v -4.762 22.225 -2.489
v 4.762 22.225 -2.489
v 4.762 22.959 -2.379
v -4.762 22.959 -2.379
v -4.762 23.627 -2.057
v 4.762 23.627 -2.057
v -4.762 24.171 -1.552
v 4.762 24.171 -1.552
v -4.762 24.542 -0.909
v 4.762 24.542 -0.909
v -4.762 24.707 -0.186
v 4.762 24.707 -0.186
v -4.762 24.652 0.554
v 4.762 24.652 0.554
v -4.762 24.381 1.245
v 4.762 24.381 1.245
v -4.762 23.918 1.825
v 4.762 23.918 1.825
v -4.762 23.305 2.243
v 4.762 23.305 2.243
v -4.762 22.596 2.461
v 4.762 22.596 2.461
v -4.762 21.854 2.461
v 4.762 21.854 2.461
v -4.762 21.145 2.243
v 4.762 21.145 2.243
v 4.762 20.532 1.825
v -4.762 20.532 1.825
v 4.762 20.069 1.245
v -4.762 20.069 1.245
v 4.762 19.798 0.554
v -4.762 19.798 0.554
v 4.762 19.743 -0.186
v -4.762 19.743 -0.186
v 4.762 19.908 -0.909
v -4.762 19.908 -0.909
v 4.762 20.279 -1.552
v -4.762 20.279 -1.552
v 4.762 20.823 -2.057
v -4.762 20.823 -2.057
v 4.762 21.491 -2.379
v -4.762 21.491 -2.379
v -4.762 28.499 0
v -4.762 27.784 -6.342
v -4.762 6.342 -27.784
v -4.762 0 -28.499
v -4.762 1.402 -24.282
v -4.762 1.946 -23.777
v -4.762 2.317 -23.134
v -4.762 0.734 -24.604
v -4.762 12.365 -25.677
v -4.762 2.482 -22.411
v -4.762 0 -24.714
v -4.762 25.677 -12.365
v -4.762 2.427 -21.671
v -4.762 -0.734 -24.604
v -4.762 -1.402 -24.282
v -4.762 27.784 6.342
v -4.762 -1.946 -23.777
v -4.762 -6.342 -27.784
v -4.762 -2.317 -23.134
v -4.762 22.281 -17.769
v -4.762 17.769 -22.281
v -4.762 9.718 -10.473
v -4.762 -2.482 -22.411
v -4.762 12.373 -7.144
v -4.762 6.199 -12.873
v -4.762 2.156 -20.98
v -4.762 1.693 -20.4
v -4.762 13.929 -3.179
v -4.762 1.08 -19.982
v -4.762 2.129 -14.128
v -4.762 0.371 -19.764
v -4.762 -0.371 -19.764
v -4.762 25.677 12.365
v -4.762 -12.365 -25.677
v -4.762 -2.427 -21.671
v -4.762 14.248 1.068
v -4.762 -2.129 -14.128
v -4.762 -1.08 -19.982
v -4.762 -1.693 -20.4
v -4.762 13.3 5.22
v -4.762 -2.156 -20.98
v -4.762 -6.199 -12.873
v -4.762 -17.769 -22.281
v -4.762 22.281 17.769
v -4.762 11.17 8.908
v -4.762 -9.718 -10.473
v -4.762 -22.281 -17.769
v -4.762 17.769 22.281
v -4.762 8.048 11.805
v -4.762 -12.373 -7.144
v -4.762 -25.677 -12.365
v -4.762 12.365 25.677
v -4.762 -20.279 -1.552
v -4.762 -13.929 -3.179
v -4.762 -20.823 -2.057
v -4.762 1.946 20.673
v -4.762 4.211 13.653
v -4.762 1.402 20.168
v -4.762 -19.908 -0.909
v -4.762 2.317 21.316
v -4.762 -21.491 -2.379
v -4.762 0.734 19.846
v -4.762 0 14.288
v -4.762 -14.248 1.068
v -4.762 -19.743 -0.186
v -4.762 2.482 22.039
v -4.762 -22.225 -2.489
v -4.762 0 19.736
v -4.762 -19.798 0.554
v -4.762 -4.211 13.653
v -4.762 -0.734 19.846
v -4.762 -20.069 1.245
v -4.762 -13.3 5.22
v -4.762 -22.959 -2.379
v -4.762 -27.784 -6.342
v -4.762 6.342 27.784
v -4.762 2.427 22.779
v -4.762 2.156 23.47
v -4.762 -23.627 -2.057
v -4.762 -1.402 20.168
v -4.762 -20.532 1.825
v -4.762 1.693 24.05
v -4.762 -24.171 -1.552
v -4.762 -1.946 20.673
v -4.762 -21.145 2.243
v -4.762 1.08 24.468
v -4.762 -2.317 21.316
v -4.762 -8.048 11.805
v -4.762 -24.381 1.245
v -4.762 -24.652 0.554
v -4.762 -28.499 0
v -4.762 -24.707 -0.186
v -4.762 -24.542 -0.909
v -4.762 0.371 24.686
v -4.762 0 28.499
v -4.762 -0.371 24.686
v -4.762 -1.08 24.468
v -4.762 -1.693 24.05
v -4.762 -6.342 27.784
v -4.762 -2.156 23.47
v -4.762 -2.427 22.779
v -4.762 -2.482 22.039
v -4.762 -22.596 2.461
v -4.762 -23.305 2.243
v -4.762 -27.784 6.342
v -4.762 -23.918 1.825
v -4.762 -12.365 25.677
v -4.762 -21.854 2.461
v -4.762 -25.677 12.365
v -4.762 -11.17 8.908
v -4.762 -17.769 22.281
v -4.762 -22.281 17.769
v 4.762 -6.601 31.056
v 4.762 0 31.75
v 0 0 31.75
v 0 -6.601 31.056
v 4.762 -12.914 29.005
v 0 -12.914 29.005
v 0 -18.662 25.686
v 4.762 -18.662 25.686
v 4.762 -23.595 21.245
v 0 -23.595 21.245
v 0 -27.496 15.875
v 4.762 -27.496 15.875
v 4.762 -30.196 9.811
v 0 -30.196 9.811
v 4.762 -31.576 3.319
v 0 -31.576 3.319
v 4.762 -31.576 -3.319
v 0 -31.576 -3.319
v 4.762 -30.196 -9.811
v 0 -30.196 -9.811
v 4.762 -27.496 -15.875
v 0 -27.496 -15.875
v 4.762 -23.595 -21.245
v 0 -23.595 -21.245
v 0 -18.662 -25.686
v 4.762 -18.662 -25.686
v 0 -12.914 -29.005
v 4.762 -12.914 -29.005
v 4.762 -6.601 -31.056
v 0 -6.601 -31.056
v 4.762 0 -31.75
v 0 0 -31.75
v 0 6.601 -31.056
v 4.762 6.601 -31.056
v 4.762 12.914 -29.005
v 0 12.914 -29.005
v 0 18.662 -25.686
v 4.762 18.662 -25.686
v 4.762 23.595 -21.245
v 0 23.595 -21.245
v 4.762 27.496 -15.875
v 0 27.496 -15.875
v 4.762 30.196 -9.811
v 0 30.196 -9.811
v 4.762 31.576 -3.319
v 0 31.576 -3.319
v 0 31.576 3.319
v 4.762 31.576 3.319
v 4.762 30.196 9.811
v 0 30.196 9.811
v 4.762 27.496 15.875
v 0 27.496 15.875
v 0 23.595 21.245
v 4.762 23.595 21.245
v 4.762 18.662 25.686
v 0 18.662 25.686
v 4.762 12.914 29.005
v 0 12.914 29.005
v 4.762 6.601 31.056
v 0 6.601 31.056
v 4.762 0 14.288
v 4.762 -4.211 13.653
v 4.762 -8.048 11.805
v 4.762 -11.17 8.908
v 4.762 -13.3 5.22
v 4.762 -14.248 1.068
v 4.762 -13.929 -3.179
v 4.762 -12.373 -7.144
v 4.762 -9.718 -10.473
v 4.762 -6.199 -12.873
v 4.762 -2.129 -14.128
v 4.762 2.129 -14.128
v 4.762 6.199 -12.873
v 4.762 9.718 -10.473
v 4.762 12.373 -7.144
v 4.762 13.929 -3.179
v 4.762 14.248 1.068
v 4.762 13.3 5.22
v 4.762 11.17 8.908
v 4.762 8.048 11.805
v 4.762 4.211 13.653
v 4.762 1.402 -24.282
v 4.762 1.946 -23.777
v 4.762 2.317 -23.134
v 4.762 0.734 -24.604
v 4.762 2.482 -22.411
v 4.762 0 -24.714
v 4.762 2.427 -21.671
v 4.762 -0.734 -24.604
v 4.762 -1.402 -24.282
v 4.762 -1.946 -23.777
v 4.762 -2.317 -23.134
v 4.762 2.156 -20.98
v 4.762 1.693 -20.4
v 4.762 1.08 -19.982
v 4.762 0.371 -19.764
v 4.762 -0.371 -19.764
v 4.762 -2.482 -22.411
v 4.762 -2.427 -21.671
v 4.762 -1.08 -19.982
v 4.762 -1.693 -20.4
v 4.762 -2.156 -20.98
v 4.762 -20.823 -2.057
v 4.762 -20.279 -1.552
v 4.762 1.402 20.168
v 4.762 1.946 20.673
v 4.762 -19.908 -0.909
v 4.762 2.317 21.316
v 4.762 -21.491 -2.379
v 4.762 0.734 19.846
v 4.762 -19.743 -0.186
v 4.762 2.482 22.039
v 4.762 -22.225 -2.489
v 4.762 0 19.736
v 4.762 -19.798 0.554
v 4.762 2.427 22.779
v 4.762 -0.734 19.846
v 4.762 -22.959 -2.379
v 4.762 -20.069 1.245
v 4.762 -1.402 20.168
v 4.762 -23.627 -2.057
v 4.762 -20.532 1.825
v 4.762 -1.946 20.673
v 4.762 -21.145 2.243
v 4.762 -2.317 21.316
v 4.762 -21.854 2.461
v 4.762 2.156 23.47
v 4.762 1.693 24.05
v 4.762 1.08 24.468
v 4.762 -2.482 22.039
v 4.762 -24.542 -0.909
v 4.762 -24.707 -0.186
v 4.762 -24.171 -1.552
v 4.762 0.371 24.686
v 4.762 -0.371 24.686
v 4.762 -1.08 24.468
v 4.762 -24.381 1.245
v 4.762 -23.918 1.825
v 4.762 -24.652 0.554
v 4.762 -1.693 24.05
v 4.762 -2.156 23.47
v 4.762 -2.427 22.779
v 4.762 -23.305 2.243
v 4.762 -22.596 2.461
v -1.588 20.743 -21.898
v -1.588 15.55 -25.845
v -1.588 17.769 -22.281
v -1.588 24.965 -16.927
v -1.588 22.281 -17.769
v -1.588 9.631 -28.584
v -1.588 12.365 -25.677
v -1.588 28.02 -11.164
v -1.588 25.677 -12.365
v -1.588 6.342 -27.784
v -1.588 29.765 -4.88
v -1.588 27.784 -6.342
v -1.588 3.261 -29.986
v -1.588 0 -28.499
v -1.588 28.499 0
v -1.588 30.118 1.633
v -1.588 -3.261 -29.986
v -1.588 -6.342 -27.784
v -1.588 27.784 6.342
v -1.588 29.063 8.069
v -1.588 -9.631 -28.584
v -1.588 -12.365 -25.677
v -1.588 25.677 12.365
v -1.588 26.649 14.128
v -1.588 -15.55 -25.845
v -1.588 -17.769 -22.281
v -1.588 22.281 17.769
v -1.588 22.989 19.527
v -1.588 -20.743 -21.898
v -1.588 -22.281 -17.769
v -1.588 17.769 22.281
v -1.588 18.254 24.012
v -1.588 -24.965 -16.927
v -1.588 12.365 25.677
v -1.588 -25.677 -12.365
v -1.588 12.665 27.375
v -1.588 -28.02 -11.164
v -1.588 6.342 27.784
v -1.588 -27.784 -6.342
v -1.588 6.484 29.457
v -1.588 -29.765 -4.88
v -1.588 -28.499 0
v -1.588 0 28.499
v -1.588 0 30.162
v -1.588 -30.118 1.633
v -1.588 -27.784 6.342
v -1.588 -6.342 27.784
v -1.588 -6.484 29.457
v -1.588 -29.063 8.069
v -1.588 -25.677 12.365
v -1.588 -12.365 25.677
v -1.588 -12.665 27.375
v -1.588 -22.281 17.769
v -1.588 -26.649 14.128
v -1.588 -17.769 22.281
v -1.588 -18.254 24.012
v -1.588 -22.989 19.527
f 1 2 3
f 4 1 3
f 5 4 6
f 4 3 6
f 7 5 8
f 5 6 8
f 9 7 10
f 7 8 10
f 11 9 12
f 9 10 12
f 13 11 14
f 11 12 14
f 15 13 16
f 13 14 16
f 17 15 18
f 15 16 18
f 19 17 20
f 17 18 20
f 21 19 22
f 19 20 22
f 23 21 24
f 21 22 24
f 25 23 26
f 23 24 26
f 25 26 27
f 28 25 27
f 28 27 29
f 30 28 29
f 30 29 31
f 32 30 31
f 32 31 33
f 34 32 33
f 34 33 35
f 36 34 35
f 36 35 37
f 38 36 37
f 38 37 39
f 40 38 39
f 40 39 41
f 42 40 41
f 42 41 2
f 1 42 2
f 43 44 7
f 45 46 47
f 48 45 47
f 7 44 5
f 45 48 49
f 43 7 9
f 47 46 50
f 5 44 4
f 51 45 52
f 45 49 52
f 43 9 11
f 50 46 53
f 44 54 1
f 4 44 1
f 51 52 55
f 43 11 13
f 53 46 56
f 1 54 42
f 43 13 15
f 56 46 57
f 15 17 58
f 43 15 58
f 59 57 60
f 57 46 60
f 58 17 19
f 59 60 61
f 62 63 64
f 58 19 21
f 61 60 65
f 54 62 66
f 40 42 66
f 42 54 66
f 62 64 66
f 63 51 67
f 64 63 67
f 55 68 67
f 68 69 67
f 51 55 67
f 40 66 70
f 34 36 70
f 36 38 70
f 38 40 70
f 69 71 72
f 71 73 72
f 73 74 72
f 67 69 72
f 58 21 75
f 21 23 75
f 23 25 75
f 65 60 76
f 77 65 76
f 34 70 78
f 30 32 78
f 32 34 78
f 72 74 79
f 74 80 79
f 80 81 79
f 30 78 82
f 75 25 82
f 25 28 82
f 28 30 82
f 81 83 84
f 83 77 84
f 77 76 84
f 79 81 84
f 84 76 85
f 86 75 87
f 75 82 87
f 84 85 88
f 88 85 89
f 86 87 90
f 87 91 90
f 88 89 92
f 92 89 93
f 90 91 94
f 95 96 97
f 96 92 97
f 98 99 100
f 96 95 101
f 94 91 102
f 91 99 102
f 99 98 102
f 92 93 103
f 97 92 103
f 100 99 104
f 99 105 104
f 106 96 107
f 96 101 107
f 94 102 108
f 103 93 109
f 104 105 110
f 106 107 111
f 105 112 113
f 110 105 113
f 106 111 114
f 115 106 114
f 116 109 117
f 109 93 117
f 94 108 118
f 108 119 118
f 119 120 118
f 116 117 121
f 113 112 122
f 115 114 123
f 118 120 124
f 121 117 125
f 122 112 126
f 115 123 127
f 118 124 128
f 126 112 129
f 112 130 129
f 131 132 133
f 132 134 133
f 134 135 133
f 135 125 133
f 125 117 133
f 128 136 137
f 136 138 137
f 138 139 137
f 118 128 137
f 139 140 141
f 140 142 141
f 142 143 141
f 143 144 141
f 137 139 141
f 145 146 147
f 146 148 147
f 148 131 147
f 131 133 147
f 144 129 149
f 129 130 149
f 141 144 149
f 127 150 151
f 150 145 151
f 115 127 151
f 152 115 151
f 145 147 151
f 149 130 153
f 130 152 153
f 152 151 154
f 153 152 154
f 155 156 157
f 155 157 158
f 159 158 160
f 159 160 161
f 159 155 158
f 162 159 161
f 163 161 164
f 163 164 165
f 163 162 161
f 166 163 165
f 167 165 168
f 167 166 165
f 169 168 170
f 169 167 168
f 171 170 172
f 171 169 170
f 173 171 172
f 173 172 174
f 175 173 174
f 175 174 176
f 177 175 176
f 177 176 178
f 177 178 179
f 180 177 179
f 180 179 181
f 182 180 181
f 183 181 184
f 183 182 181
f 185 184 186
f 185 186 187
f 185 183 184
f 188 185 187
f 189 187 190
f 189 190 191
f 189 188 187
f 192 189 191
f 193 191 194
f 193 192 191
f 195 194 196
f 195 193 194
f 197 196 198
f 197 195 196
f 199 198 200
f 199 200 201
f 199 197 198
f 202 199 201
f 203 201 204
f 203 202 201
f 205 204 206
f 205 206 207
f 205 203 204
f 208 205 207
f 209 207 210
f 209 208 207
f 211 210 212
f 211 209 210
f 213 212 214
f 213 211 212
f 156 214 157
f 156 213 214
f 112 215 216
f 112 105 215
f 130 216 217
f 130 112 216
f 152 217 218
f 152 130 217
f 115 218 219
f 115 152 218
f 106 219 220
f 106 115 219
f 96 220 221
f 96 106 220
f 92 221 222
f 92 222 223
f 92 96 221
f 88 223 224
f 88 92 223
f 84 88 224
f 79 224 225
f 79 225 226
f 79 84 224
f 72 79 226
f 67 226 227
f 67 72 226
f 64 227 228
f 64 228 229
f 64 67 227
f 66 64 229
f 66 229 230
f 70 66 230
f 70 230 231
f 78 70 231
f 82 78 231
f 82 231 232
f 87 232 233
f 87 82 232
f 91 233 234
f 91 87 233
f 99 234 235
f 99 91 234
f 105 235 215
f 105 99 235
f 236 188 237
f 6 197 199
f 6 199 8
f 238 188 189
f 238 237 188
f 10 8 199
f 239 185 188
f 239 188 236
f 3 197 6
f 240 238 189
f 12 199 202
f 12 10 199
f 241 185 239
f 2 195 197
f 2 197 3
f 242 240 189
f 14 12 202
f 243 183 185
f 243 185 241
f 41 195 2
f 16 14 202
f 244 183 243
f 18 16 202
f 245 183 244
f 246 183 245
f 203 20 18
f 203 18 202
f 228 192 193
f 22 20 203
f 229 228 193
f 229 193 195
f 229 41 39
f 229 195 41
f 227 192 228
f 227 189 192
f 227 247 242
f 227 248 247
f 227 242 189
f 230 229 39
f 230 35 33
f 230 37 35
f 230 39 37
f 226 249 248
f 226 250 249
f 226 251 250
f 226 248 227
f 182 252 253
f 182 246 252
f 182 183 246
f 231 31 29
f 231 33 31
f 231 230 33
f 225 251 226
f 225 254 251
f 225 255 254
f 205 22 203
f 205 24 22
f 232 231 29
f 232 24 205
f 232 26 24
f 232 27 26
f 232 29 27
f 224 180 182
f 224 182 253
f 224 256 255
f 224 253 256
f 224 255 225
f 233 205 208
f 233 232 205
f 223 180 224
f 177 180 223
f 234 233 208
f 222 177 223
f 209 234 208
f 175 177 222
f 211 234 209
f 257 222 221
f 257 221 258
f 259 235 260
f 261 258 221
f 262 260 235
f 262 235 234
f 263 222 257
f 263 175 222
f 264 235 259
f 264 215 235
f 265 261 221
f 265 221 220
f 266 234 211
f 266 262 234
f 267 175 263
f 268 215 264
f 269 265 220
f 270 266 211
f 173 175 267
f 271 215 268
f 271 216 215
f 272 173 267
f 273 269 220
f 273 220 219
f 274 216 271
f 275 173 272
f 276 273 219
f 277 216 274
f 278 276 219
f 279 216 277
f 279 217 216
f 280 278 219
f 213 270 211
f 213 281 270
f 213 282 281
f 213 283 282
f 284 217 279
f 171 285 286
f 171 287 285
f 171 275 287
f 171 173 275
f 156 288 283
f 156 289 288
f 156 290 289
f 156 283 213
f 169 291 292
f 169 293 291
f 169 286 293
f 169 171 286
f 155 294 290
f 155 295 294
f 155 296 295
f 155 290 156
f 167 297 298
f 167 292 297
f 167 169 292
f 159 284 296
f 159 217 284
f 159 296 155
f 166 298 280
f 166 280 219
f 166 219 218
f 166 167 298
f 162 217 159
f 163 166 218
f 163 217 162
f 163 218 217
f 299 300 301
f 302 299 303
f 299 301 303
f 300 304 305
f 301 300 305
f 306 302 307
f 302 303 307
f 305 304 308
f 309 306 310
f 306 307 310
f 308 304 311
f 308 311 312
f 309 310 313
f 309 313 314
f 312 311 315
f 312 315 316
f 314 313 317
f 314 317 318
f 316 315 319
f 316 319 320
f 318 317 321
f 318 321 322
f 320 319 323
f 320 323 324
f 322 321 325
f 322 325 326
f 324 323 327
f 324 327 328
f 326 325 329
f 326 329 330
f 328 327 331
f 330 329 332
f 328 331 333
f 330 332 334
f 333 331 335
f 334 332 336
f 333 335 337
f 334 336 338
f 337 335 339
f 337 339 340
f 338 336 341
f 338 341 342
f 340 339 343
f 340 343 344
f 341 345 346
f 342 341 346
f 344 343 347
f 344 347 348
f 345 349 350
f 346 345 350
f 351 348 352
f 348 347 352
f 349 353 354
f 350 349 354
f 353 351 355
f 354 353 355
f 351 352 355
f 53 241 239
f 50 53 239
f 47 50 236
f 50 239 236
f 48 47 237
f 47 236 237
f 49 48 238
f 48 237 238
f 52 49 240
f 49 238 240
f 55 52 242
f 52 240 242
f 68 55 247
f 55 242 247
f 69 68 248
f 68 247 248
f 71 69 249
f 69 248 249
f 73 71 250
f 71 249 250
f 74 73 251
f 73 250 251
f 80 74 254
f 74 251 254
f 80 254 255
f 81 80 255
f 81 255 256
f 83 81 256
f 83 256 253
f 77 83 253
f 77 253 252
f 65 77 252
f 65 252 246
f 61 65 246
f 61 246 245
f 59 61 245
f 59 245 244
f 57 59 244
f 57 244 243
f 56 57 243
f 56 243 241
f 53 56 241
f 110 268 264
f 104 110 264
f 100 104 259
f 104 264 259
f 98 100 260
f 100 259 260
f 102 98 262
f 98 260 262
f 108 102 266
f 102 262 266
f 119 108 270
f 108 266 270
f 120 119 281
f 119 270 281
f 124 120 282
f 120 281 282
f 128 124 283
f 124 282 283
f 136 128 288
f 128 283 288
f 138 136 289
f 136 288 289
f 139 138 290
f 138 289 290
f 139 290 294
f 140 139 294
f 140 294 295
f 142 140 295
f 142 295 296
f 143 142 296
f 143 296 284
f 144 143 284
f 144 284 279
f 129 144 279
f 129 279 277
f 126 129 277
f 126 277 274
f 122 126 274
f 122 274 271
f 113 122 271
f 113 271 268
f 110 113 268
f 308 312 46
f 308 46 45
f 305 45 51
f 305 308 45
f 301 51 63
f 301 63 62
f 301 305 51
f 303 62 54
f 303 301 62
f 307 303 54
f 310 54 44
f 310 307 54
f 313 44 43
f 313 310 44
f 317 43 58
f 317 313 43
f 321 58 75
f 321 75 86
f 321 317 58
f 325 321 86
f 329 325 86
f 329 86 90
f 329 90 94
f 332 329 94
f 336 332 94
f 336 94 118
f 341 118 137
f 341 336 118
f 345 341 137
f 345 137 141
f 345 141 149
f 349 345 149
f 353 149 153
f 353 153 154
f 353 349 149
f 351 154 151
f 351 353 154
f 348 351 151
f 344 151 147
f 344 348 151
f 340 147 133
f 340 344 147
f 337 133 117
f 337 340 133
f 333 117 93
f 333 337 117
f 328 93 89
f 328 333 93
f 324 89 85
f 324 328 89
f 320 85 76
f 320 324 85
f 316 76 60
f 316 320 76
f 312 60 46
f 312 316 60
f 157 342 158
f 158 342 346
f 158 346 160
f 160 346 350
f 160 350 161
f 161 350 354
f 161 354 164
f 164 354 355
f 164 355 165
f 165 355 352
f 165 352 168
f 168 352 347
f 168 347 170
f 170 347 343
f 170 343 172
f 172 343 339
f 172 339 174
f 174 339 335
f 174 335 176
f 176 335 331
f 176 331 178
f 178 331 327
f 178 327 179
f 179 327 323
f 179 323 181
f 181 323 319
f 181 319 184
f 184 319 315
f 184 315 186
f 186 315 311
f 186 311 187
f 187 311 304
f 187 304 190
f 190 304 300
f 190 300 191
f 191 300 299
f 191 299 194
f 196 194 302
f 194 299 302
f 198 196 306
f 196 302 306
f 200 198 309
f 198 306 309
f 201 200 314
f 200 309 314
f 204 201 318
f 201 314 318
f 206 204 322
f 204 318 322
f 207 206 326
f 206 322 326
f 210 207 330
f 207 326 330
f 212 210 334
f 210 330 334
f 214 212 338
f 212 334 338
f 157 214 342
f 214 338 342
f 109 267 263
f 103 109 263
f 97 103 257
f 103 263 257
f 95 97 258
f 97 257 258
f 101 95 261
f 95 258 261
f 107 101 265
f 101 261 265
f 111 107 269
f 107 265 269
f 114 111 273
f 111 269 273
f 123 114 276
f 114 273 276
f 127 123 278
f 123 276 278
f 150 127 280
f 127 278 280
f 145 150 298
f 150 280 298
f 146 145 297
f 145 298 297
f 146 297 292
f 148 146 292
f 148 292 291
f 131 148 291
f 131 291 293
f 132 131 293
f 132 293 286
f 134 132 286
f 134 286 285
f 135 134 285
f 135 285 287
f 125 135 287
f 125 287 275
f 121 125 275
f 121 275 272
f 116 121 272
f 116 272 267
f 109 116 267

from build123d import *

# Parameters (mm, degrees)
SKETCH1_R           = 31.75
SKETCH1_R_2         = 14.2875
BOSS_EXTRUDE1_DEPTH = 4.7625
CUT_EXTRUDE1_START  = 3.175
SKETCH2_R           = 31.75
SKETCH2_R_2         = 28.4988
CUT_EXTRUDE1_DEPTH  = 3.175
SKETCH3_R           = 2.4892
CUT_EXTRUDE2_DEPTH  = 46.900442536
CHAMFER1_SIZE       = 1.5875


with BuildPart() as part:
    # Sketch1 → Boss-Extrude1 (new, symmetric)
    with BuildSketch(Plane(origin=(0, 0, 0), x_dir=(0, 0, -1), z_dir=(1, 0, 0))):
        with Locations(Location((0, 0, 0), (0, 0, 180))):
            Circle(SKETCH1_R)
        with Locations(Location((0, 0, 0), (0, 0, 180))):
            Circle(SKETCH1_R_2, mode=Mode.SUBTRACT)
    extrude(amount=BOSS_EXTRUDE1_DEPTH, both=True)

    # Sketch2 → Cut-Extrude1 (cut)
    with BuildSketch(Plane(origin=(-4.7625, 0, 0), x_dir=(0, 0, -1), z_dir=(1, 0, 0)).offset(CUT_EXTRUDE1_START)):
        with Locations(Location((0, 0, 0), (0, 0, 180))):
            Circle(SKETCH2_R)
        Circle(SKETCH2_R_2, mode=Mode.SUBTRACT)
    extrude(amount=-CUT_EXTRUDE1_DEPTH, mode=Mode.SUBTRACT)

    # Sketch3 → Cut-Extrude2 (cut, through all)
    with BuildSketch(Plane(origin=(4.7625, 0, 0), x_dir=(0, 0, -1), z_dir=(1, 0, 0))):
        with Locations((0, 22.225)):
            Circle(SKETCH3_R)
        with Locations((-22.225, 0)):
            Circle(SKETCH3_R)
        with Locations((0, -22.225)):
            Circle(SKETCH3_R)
        with Locations((22.225, 0)):
            Circle(SKETCH3_R)
    extrude(amount=-CUT_EXTRUDE2_DEPTH, mode=Mode.SUBTRACT)

    # Chamfer1
    chamfer1_edges = [part.edges().sort_by_distance(p)[0] for p in [
        (-1.5875, 0, -31.75),
    ]]
    chamfer(chamfer1_edges, length=CHAMFER1_SIZE)


solid = part.part
